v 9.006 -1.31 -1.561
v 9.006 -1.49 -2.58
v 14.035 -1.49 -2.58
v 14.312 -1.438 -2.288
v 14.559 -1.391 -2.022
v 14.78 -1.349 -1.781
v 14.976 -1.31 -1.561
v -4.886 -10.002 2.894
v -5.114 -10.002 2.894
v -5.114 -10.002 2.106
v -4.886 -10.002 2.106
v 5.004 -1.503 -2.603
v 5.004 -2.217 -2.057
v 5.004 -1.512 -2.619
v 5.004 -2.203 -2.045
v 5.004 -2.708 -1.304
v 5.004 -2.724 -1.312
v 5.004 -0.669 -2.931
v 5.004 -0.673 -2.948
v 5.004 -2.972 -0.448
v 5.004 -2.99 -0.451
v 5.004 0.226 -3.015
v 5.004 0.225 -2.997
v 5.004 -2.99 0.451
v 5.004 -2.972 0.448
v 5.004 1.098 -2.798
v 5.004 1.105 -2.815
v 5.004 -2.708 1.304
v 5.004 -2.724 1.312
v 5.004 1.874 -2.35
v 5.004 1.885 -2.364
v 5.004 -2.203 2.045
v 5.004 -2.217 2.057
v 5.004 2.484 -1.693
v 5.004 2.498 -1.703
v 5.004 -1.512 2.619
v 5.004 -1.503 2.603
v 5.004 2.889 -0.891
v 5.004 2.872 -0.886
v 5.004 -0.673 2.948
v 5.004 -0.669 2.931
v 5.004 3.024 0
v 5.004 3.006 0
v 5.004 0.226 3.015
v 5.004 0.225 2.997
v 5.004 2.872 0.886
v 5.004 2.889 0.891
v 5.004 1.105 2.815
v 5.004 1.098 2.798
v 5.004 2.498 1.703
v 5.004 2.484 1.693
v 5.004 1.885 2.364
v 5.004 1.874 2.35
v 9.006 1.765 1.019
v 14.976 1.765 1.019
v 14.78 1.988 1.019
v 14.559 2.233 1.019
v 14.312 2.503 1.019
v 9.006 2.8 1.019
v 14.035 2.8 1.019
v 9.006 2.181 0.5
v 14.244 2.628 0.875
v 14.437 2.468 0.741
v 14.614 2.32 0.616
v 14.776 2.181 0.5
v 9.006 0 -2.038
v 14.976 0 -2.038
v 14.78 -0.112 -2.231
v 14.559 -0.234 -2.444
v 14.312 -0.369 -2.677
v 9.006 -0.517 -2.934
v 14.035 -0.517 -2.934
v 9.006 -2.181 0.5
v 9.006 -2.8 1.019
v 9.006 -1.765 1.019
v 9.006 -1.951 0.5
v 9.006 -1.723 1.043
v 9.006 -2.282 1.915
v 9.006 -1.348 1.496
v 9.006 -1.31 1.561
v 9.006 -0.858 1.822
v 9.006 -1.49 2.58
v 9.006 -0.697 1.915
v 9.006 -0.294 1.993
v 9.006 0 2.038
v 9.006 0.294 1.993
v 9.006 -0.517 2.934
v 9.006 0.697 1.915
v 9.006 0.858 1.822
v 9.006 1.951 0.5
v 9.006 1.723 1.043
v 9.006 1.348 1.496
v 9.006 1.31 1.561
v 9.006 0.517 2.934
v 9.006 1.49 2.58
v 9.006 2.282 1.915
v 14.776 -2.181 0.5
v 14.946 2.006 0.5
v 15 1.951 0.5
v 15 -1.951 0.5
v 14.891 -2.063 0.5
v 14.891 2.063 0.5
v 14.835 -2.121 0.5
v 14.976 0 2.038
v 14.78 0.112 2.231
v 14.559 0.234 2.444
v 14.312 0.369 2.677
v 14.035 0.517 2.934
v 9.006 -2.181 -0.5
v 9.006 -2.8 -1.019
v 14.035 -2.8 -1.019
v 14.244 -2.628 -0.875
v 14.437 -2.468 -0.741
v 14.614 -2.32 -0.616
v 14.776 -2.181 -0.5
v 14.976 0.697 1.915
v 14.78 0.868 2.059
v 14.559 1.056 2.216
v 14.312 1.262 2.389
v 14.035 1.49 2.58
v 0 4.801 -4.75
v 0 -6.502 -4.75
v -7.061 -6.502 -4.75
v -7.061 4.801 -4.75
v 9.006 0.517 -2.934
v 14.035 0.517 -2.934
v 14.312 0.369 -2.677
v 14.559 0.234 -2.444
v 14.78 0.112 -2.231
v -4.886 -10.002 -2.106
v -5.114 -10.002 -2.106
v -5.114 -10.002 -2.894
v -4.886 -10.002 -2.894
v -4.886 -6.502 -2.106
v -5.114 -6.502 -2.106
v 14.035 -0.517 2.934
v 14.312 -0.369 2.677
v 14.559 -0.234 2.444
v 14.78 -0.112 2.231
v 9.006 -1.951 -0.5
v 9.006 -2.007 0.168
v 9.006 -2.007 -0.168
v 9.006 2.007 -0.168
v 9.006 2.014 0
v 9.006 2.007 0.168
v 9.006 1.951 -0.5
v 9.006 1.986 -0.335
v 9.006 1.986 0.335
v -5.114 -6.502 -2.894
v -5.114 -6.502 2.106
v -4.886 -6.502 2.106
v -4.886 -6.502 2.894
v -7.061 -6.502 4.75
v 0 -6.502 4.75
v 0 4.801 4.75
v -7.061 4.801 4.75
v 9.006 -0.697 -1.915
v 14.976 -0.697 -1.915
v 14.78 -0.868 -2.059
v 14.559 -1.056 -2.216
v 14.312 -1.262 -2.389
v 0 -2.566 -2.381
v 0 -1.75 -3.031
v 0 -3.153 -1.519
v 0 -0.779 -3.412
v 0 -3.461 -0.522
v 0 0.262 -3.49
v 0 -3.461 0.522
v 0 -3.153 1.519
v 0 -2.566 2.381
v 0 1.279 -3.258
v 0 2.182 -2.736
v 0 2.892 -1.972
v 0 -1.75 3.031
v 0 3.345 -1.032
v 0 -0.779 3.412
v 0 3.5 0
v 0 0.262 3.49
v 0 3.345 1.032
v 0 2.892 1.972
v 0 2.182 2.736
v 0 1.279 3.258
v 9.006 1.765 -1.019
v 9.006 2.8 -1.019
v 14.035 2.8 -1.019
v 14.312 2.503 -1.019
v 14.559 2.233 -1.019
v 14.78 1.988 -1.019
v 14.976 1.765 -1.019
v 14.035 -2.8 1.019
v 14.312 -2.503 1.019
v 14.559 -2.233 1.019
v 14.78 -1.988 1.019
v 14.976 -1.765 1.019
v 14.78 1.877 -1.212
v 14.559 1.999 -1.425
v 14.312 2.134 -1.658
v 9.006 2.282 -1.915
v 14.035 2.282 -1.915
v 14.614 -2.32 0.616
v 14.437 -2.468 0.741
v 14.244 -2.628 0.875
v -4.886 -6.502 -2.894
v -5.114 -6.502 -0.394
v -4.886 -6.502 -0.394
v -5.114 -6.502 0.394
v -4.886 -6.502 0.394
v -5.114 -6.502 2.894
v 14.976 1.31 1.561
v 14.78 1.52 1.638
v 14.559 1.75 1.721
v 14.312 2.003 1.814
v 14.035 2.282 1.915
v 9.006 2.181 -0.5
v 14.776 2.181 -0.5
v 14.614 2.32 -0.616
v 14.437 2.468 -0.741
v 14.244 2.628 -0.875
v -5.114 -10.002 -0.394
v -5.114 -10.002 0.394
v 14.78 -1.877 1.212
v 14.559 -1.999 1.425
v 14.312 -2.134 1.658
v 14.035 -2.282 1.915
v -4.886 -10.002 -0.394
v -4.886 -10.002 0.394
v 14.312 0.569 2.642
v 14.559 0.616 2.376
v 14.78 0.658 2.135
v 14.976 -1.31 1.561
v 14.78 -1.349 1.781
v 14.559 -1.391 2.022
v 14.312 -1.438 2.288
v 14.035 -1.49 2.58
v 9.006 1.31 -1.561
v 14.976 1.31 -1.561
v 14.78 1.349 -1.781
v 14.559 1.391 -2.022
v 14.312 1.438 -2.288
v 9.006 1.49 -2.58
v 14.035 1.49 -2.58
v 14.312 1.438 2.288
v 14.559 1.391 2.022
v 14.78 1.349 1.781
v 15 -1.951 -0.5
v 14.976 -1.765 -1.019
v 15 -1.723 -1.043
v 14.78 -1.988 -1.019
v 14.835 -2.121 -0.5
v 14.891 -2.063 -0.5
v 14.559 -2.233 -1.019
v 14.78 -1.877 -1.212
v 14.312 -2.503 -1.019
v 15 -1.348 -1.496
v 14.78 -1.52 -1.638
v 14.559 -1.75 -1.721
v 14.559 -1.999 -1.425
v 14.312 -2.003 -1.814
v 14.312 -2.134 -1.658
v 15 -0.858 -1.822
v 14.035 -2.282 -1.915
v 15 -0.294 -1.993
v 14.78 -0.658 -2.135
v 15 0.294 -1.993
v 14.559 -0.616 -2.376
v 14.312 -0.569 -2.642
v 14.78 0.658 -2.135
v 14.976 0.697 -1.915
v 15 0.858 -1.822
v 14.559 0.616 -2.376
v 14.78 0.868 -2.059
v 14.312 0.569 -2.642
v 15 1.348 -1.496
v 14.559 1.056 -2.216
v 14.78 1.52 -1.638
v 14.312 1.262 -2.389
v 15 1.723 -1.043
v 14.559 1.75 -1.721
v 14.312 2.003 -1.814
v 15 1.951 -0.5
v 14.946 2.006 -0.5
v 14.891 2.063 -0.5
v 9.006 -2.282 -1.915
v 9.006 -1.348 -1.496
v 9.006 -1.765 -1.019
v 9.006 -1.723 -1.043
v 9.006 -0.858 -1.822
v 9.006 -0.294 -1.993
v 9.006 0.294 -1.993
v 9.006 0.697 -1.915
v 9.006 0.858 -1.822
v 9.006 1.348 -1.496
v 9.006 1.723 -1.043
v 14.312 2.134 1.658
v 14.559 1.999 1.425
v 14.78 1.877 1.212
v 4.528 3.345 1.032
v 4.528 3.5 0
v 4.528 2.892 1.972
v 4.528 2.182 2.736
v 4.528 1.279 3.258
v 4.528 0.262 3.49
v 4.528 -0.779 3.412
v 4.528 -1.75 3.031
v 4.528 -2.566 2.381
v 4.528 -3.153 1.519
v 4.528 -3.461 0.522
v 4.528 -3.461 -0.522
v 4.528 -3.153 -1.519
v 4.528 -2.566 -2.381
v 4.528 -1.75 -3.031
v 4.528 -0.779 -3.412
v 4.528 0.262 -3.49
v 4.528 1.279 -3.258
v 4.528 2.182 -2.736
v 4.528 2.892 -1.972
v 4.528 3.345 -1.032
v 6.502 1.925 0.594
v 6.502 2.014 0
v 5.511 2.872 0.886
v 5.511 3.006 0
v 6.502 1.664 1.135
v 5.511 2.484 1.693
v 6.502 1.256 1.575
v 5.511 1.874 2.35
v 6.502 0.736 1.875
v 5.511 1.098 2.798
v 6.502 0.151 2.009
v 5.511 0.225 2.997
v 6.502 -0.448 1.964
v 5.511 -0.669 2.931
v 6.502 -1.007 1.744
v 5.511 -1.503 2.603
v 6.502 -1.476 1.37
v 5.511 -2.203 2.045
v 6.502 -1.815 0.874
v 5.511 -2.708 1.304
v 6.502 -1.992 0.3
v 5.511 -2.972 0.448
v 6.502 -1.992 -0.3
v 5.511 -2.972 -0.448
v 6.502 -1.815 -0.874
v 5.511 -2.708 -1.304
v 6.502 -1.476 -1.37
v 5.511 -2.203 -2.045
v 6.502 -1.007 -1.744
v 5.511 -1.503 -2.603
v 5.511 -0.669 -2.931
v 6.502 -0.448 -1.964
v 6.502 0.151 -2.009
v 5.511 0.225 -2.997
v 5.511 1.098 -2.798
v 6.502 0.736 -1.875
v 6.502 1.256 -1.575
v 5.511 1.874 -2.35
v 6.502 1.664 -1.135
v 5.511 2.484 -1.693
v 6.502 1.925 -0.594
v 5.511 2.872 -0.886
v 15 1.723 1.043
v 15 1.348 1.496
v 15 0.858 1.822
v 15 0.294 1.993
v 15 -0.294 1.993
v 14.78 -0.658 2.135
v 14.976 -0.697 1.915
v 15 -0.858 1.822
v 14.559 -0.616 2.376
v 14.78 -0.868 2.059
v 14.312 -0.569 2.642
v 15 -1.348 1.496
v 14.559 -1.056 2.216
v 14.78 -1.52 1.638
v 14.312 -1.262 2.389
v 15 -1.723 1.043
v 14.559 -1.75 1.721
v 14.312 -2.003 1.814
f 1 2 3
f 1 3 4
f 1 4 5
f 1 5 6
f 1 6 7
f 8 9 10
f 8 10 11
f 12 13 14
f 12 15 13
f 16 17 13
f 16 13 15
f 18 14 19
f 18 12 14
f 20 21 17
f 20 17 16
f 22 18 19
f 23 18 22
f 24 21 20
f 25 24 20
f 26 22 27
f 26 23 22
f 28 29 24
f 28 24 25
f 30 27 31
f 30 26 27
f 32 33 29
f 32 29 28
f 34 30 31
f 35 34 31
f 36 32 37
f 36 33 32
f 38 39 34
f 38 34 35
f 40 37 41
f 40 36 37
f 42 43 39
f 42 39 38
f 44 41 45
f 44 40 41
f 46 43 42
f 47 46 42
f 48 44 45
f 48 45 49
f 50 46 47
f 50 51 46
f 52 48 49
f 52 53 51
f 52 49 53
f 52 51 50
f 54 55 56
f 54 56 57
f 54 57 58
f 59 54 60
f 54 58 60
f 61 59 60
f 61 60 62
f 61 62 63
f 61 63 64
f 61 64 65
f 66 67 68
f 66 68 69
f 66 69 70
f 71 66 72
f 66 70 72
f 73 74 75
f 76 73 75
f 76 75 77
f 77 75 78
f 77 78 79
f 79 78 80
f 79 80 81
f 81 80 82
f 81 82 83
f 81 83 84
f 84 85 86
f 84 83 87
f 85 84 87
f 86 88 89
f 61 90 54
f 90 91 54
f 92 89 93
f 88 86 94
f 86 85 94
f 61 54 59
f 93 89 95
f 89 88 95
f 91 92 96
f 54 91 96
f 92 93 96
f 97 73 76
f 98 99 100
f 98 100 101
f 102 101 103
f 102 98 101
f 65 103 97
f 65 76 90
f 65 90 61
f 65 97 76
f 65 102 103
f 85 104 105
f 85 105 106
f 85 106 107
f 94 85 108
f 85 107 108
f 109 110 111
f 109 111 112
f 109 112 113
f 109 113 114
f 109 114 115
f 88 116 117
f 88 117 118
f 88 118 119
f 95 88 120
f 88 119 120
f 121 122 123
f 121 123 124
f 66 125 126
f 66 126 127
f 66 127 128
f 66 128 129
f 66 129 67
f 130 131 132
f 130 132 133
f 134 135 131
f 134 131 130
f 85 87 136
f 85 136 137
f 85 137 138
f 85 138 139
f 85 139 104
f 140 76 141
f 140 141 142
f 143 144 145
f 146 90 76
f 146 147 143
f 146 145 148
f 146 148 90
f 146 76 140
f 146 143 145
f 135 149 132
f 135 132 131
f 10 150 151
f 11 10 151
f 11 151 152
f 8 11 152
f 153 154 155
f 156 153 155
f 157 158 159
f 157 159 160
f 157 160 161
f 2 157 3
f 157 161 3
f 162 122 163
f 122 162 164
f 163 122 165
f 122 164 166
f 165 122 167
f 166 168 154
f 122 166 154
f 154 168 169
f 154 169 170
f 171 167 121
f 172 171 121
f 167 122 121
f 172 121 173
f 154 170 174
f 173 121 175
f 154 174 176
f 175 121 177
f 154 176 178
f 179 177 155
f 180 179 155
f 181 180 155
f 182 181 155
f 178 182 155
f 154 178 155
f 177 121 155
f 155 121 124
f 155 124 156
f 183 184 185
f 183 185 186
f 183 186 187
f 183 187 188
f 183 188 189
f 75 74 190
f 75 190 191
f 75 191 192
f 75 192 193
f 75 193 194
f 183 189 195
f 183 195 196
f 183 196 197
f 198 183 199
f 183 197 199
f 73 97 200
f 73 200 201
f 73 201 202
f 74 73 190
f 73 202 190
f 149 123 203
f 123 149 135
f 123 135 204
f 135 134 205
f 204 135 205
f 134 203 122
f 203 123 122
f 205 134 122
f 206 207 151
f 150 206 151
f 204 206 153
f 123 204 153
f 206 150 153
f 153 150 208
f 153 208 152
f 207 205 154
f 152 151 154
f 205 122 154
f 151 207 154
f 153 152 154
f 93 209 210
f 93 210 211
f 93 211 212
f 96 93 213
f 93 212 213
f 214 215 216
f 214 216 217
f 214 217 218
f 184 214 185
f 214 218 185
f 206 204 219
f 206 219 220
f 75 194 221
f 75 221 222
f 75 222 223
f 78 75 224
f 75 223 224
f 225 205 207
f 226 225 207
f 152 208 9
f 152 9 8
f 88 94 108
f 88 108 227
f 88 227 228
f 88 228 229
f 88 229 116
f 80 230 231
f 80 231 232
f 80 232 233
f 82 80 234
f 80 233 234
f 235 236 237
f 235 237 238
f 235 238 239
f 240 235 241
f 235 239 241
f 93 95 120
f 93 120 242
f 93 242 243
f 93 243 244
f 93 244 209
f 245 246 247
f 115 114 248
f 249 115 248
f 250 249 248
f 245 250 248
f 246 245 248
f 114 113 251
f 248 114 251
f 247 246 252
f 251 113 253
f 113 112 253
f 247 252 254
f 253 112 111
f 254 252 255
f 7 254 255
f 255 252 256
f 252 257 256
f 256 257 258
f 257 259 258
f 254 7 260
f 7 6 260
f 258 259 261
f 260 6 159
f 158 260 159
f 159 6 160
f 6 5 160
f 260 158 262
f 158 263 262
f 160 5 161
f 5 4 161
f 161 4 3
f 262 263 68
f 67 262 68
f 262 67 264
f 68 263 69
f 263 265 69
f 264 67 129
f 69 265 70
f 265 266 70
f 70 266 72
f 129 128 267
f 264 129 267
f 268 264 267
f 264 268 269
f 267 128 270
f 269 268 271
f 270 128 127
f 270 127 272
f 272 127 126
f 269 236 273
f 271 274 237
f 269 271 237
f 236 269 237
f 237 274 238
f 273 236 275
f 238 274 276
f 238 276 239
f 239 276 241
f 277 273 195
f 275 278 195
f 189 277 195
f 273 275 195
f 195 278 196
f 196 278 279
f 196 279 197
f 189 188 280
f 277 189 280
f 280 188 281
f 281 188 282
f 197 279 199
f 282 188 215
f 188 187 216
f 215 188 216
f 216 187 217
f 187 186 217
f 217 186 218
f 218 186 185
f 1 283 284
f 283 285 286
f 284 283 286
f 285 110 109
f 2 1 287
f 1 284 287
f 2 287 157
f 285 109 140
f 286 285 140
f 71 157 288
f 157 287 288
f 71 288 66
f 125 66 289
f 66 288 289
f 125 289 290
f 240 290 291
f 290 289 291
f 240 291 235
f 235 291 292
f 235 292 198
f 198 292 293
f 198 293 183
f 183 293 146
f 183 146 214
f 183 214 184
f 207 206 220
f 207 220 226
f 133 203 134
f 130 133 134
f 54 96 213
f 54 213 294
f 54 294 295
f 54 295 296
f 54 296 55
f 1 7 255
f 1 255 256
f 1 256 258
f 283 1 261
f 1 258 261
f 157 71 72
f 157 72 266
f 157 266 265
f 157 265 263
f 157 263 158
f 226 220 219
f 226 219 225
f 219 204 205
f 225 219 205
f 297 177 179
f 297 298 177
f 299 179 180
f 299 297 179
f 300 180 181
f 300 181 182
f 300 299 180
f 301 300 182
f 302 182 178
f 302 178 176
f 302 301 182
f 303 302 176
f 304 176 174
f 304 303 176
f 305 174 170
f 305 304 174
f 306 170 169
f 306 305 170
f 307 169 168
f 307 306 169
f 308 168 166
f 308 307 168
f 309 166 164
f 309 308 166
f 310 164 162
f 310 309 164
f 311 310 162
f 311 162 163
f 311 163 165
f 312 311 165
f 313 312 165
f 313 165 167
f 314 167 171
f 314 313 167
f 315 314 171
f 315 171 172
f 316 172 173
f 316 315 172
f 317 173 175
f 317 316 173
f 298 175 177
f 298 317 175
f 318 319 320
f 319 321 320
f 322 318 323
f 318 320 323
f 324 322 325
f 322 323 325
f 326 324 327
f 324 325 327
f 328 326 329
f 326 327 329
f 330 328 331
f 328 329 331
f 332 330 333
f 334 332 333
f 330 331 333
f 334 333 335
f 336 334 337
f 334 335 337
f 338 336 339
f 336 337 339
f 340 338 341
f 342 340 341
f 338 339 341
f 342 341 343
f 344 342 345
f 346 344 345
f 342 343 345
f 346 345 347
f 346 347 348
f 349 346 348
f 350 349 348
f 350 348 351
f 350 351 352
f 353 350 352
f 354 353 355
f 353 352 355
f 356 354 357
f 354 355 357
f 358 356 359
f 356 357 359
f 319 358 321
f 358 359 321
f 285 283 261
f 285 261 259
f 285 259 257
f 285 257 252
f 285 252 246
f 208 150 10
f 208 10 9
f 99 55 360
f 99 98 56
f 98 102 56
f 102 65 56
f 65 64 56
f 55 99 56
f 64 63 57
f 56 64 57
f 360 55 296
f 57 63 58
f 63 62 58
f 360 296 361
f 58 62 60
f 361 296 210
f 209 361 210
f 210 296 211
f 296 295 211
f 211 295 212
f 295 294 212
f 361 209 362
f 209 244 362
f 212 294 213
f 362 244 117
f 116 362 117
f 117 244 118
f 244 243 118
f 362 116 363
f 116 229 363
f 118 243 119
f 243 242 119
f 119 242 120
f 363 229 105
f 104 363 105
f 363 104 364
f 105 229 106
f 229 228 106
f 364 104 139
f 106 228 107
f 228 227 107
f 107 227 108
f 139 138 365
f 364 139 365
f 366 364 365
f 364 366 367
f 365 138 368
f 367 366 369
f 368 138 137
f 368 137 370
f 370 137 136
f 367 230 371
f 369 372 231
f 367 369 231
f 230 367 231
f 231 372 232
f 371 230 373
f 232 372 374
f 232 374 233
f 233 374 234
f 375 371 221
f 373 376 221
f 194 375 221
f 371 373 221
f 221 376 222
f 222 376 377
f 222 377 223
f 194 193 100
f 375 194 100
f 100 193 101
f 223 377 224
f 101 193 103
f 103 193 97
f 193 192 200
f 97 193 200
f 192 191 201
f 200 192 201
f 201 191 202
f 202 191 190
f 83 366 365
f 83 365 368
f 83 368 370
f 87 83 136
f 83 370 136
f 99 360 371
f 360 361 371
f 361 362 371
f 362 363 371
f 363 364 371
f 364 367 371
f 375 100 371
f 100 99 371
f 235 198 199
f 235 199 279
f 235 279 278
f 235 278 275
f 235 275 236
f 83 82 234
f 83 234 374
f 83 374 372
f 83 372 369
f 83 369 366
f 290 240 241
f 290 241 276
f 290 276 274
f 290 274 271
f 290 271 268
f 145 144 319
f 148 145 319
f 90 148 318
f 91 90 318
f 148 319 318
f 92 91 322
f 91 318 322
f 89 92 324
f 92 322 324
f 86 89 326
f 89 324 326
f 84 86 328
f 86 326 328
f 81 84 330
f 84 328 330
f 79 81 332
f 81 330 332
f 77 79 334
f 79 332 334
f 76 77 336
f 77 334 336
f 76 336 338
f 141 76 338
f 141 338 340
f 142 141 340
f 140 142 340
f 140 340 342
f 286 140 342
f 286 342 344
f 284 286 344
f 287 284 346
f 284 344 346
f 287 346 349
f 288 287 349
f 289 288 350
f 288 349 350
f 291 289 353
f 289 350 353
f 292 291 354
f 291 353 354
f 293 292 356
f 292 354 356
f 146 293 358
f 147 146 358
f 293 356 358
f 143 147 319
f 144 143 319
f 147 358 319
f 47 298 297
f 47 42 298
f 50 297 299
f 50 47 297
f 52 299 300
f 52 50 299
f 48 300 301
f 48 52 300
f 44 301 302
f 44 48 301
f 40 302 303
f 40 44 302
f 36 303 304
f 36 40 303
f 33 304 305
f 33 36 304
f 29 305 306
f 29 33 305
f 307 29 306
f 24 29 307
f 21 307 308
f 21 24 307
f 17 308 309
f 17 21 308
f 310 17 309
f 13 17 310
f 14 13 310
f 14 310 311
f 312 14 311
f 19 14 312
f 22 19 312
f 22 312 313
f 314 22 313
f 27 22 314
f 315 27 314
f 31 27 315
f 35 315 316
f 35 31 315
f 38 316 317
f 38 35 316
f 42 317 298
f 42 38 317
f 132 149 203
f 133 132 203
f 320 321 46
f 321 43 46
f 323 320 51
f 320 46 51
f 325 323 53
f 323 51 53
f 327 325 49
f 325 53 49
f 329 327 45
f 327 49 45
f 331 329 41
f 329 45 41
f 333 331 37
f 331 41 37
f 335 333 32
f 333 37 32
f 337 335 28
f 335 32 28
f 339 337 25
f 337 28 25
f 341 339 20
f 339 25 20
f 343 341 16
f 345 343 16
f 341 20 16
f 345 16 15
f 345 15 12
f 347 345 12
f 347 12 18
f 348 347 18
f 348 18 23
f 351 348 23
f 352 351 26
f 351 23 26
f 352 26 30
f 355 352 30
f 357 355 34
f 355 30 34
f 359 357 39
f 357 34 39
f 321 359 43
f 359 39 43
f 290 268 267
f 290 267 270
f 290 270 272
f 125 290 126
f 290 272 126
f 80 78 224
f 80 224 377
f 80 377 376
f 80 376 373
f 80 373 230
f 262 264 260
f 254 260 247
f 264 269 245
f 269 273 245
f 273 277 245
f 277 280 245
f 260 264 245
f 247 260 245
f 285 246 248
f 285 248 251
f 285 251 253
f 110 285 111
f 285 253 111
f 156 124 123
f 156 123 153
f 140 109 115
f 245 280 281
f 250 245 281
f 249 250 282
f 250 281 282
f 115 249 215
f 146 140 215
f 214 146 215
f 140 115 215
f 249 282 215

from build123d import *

# Parameters (mm, degrees)
SKETCH2_R                     = 3.811725635
F_18_TEETH_KNURLS_DEPTH       = 5.9944
SKETCH3_W                     = 1
SKETCH3_H                     = 6.35
CUT_EXTRUDE2_DEPTH            = 5.9944
SKETCH4_W                     = 9.4996
SKETCH4_H                     = 11.303
BODY_DEPTH                    = 7.0612
SKETCH6_W                     = 0.2286
SKETCH6_H                     = 0.7874
PINS_PTD901_ONE_SECTION_DEPTH = 3.5


with BuildPart() as part:
    # Sketch1 → Shaft Base (revolve)
    with BuildSketch(Plane.XY):
        Polygon((0, 3.5), (4.52755, 3.5), (5.0038, 3.02375), (5.0038, 0), (0, 0), align=None)
    revolve(axis=Axis((-1.517556918, 0, 0), (1, 0, 0)))

    # Sketch8 → K Style Shaft (revolve)
    with BuildSketch(Plane.XY):
        Polygon((5.0038, 3.00589629), (5.0038, 0), (15, 0), (15, 2.01414629), (14.0348, 2.97934629), (9.0056, 2.97934629), (9.0056, 2.01414629), (6.5024, 2.01414629), (5.51065, 3.00589629), align=None)
    revolve(axis=Axis((-8.258778459, 0, 0), (1, 0, 0)))

    # Sketch2 → 18 Teeth Knurls (cut)
    with BuildSketch(Plane(origin=(15, 0, 0), x_dir=(0, 0, -1), z_dir=(1, 0, 0))):
        Circle(SKETCH2_R)
        Polygon((0, 2.97934629), (0.353893751, 2.007031199), (1.018996445, 2.799669723), (1.018996445, 1.764953616), (1.91508688, 2.282311669), (1.561193129, 1.309996578), (2.580189574, 1.489673145), (1.91508688, 0.69703462), (2.934083325, 0.517358054), (2.03799289, 0), (2.934083325, -0.517358054), (1.91508688, -0.69703462), (2.580189574, -1.489673145), (1.561193129, -1.309996578), (1.91508688, -2.282311669), (1.018996445, -1.764953616), (1.018996445, -2.799669723), (0.353893751, -2.007031199), (0, -2.97934629), (-0.353893751, -2.007031199), (-1.018996445, -2.799669723), (-1.018996445, -1.764953616), (-1.91508688, -2.282311669), (-1.561193129, -1.309996578), (-2.580189574, -1.489673145), (-1.91508688, -0.69703462), (-2.934083325, -0.517358054), (-2.03799289, 0), (-2.934083325, 0.517358054), (-1.91508688, 0.69703462), (-2.580189574, 1.489673145), (-1.561193129, 1.309996578), (-1.91508688, 2.282311669), (-1.018996445, 1.764953616), (-1.018996445, 2.799669723), (-0.353893751, 2.007031199), align=None, mode=Mode.SUBTRACT)
    extrude(amount=-F_18_TEETH_KNURLS_DEPTH, mode=Mode.SUBTRACT)

    # Sketch3 → Cut-Extrude2 (cut)
    with BuildSketch(Plane(origin=(15, 0, 0), x_dir=(0, 0, -1), z_dir=(1, 0, 0))):
        Rectangle(SKETCH3_W, SKETCH3_H)
    extrude(amount=-CUT_EXTRUDE2_DEPTH, mode=Mode.SUBTRACT)

    # Sketch4 → Body (add)
    with BuildSketch(Plane.ZY):
        with Locations((0, -0.8509)):
            Rectangle(SKETCH4_W, SKETCH4_H)
    extrude(amount=BODY_DEPTH)

    # Sketch6 → Pins PTD901 (one section) (add)
    with BuildSketch(Plane.XZ.offset(6.5024)):
        with Locations((-5, -2.5)):
            Rectangle(SKETCH6_W, SKETCH6_H)
        with Locations((-5, 0)):
            Rectangle(SKETCH6_W, SKETCH6_H)
        with Locations((-5, 2.5)):
            Rectangle(SKETCH6_W, SKETCH6_H)
    extrude(amount=PINS_PTD901_ONE_SECTION_DEPTH)


solid = part.part
